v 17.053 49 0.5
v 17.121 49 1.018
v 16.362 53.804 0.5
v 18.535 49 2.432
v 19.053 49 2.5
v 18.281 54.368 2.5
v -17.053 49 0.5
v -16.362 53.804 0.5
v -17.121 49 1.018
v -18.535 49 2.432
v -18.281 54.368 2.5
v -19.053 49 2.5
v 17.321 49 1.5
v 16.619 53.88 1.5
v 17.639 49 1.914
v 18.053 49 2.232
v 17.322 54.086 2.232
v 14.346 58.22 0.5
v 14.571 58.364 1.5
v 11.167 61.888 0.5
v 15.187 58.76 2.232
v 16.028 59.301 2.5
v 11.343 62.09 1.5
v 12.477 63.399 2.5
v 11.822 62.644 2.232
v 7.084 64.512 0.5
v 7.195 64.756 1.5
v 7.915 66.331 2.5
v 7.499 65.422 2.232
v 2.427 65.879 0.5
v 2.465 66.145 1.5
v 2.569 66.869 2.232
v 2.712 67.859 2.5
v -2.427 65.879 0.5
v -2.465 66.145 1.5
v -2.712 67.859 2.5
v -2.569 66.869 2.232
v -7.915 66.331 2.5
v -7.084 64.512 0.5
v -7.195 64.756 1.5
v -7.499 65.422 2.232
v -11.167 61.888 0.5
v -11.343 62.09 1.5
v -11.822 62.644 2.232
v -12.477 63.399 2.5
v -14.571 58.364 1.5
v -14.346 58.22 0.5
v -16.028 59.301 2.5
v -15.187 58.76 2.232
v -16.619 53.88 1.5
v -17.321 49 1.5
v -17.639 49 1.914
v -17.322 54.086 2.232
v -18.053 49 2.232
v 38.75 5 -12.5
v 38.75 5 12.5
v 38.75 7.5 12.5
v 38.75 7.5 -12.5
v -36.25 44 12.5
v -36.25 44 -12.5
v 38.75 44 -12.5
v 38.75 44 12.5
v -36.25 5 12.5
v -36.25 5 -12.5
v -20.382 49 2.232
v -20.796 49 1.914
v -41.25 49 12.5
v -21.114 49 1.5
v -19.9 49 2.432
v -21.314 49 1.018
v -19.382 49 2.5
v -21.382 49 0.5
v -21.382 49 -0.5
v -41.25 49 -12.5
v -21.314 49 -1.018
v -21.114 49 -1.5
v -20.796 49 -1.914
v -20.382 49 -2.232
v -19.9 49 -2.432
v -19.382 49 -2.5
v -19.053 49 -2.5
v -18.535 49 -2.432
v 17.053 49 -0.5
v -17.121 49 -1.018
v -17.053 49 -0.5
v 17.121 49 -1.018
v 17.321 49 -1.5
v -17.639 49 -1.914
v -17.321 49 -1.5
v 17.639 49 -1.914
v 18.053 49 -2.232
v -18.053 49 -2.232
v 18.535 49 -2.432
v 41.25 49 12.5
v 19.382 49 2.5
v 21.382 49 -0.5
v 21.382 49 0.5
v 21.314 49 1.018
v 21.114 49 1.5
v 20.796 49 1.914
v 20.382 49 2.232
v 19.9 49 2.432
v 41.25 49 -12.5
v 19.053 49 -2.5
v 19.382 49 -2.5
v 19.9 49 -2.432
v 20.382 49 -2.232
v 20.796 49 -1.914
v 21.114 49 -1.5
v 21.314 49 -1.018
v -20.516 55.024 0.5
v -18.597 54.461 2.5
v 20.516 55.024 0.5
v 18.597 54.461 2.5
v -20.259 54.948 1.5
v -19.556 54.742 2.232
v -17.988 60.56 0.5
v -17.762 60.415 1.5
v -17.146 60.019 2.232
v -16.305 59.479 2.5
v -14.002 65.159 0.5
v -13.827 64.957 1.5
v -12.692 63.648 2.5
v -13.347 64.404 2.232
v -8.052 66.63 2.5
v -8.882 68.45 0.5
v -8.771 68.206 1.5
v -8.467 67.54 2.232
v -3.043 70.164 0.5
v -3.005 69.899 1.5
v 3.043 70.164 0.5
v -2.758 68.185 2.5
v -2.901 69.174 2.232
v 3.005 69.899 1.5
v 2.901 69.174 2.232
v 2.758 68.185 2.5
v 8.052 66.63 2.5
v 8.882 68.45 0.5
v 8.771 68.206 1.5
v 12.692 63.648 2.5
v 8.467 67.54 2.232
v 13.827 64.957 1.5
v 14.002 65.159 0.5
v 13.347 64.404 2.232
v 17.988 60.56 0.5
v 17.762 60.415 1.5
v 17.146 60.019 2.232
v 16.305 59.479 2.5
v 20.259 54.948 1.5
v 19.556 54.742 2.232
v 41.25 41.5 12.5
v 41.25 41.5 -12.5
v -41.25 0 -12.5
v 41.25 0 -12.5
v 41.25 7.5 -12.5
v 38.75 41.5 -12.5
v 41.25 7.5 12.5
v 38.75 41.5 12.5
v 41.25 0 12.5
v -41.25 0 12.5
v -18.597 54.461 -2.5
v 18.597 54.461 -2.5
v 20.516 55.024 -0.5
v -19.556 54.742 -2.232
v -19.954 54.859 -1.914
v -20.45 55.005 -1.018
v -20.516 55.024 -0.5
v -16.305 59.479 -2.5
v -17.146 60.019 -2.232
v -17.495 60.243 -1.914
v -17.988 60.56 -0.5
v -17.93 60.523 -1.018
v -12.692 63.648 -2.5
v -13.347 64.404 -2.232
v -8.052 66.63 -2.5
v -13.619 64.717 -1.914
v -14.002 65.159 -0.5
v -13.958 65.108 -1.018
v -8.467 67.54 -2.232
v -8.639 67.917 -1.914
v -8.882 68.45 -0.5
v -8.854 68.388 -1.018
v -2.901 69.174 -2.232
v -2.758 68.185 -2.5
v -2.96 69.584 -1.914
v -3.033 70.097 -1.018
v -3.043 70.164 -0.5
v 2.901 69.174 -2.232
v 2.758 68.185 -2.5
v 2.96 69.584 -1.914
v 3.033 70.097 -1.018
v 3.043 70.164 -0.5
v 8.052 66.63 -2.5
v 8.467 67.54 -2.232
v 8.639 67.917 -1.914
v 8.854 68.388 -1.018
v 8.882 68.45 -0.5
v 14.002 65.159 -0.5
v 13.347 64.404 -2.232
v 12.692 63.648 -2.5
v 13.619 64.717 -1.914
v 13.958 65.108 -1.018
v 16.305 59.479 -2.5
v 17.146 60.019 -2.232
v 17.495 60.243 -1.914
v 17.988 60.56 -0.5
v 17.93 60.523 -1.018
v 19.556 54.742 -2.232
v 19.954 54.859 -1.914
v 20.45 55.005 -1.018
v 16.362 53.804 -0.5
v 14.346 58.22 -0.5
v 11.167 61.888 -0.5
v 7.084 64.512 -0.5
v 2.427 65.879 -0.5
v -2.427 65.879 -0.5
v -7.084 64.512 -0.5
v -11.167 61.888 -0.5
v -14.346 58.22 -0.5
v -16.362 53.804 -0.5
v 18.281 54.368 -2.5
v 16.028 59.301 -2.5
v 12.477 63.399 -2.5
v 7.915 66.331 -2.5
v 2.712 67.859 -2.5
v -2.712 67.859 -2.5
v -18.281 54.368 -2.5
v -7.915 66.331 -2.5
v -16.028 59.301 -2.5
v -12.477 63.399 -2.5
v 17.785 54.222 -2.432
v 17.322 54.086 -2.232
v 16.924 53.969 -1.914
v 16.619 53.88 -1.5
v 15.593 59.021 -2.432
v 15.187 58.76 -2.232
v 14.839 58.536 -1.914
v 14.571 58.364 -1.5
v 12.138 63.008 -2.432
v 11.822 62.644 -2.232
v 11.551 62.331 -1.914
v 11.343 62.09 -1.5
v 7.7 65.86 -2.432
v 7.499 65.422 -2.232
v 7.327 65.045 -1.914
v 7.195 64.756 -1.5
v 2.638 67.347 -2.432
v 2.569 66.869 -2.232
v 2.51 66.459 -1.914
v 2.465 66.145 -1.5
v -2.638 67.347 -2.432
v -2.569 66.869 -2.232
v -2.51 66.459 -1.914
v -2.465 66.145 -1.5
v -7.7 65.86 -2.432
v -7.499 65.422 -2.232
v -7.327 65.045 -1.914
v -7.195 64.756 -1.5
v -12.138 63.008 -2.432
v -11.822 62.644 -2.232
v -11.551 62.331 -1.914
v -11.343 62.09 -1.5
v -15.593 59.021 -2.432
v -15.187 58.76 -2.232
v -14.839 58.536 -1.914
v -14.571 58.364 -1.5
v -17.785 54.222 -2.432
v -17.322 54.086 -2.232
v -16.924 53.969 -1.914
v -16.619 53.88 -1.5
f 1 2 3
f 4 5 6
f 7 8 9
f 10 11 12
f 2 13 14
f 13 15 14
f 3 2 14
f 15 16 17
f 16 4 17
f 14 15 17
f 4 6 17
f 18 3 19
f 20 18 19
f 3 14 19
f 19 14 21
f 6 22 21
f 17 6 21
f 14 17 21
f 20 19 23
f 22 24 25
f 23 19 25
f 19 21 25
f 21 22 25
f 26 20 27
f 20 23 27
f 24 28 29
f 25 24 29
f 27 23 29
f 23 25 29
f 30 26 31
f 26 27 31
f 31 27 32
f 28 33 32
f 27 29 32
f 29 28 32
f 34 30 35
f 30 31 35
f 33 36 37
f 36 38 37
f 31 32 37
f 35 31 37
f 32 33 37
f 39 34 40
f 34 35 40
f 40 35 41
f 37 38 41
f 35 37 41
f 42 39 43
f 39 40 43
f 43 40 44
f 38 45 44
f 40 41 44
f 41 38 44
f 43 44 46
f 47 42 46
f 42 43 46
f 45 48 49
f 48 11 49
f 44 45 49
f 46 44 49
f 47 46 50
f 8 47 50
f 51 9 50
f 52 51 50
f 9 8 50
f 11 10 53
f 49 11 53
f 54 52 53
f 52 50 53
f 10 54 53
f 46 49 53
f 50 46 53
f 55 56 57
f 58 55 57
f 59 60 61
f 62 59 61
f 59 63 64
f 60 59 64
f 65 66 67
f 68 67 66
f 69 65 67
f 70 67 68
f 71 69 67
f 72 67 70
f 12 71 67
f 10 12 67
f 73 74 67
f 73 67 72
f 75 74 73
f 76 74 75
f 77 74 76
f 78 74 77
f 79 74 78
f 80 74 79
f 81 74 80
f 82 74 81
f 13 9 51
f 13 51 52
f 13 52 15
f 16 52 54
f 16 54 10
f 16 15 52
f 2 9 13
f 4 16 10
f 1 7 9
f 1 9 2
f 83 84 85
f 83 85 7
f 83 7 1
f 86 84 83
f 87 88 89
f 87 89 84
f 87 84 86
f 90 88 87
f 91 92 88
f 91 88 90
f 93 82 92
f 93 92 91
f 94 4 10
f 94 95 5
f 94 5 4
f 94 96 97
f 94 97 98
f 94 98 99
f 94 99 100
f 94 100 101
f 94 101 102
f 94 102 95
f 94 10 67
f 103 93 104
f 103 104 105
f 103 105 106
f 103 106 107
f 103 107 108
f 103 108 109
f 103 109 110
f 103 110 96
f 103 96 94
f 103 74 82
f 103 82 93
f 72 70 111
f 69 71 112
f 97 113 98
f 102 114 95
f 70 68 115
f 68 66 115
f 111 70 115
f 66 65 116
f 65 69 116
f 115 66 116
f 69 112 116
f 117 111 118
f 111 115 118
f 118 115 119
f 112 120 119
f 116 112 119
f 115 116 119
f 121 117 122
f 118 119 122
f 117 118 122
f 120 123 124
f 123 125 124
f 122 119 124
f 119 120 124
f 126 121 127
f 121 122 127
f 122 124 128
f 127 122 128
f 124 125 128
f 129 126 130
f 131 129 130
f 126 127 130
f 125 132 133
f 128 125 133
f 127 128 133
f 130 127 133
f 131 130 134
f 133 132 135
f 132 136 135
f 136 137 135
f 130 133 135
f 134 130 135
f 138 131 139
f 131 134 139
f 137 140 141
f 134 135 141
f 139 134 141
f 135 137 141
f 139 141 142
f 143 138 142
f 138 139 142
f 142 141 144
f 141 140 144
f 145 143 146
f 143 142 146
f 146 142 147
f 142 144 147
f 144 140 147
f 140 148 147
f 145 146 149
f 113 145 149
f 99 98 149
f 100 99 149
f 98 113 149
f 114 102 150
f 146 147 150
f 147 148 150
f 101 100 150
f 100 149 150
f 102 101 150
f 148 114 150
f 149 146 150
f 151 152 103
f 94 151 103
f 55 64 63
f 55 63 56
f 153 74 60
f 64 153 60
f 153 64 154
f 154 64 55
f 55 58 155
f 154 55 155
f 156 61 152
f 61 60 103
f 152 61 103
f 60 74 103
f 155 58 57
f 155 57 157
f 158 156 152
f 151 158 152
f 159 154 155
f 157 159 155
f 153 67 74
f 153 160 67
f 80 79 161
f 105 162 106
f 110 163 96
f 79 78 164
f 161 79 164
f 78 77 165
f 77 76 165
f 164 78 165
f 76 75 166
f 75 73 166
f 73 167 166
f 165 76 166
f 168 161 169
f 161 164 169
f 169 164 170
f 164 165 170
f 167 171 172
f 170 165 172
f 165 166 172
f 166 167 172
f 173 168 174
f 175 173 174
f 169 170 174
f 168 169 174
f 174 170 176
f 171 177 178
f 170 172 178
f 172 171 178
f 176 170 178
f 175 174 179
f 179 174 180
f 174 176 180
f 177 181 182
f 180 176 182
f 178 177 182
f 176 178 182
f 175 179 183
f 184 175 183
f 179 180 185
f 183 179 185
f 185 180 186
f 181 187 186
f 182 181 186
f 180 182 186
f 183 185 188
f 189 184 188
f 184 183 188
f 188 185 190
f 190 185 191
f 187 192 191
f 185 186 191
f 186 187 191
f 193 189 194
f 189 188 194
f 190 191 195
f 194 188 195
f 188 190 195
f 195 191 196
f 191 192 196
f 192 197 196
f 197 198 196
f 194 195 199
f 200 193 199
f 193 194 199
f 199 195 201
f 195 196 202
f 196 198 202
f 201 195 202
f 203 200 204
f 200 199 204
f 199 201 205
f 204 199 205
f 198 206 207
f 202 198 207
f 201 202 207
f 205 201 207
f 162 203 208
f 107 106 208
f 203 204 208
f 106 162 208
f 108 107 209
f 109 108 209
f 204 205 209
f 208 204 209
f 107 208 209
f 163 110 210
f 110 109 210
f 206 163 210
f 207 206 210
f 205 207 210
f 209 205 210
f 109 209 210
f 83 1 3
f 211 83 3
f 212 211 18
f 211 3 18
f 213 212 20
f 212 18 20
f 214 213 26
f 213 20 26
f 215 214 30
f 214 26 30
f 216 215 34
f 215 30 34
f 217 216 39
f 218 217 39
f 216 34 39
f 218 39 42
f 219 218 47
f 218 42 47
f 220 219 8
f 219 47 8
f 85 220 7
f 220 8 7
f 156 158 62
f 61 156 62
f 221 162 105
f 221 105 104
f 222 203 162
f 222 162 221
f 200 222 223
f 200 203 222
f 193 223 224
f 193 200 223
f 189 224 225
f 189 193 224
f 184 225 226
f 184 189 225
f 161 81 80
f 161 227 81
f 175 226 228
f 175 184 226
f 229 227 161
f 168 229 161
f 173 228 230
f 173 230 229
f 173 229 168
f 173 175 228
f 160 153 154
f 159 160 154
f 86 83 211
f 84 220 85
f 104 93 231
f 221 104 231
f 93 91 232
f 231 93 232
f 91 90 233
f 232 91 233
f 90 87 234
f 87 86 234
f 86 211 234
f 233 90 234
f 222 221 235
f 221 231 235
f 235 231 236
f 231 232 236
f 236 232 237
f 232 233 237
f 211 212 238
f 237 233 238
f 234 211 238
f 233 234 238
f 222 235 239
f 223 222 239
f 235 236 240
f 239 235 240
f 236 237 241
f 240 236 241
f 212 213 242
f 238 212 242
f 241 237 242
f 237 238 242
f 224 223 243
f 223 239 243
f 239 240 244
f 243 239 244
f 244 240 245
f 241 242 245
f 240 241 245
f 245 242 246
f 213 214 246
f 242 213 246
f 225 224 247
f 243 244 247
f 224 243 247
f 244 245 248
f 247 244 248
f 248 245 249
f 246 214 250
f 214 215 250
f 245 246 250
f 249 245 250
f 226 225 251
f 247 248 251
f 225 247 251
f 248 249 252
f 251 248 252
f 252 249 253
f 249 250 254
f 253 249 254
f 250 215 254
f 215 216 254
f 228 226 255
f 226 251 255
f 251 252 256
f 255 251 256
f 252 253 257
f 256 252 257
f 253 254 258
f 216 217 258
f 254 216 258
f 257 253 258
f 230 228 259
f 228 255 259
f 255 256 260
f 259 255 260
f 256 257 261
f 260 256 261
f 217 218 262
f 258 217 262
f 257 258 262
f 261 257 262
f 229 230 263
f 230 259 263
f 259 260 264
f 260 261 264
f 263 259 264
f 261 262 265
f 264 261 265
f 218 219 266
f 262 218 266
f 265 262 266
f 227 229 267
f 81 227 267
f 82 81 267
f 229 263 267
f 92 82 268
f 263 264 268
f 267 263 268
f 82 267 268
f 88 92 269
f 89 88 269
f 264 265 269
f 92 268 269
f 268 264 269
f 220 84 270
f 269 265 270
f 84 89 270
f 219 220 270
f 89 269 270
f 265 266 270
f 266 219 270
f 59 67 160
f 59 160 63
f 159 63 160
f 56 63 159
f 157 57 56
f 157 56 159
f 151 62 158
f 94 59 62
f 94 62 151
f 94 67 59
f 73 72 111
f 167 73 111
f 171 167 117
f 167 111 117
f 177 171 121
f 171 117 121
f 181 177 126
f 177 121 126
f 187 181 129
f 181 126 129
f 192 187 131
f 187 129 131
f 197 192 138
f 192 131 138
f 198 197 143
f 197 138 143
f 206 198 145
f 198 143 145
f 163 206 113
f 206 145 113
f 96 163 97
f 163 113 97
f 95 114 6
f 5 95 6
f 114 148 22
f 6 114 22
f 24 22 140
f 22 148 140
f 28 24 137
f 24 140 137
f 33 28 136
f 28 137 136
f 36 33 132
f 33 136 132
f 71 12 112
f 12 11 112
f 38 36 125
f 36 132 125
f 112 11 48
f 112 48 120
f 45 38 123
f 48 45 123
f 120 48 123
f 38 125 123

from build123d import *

# Parameters (mm, degrees)
SKETCH1_W               = 82.5
SKETCH1_H               = 25
BOSS_EXTRUDE1_DEPTH     = 5
SKETCH2_W               = 5
SKETCH2_H               = 25
BOSS_EXTRUDE2_DEPTH     = 39
SKETCH3_W               = 82.5
SKETCH3_H               = 25
BOSS_EXTRUDE3_DEPTH     = 5
BOSS_EXTRUDE4_DEPTH     = 2.5
SKETCH5_W               = 2.5
SKETCH5_H               = 39
BOSS_EXTRUDE5_DEPTH     = 25
CUT_EXTRUDE1_DEPTH      = 86.323912034
CUT_EXTRUDE1_DEPTH_BACK = 25
SKETCH6_W               = 5
SKETCH6_H               = 34
FILLET1_R               = 2
FILLET2_R               = 2


with BuildPart() as part:
    # Sketch1 → Boss-Extrude1 (new body)
    with BuildSketch(Plane(origin=(0, 0, 0), x_dir=(1, 0, 0), z_dir=(0, 1, 0))):
        Rectangle(SKETCH1_W, SKETCH1_H)
    extrude(amount=BOSS_EXTRUDE1_DEPTH)

    # Sketch2 → Boss-Extrude2 (add)
    with BuildSketch(Plane(origin=(0, 5, 0), x_dir=(1, 0, 0), z_dir=(0, 1, 0))):
        with Locations((-38.75, 0)):
            Rectangle(SKETCH2_W, SKETCH2_H)
    extrude(amount=BOSS_EXTRUDE2_DEPTH)

    # Sketch3 → Boss-Extrude3 (add)
    with BuildSketch(Plane(origin=(0, 44, 0), x_dir=(1, 0, 0), z_dir=(0, 1, 0))):
        Rectangle(SKETCH3_W, SKETCH3_H)
    extrude(amount=BOSS_EXTRUDE3_DEPTH)

    # Sketch4 → Boss-Extrude4 (add, symmetric)
    with BuildSketch(Plane.XY):
        with BuildLine():
            Line((-17.053024247, 49), (-21.381868864, 49))
            ThreePointArc((-21.381868864, 49), (0, 70.381868864), (21.381868864, 49))
            Line((21.381868864, 49), (17.053024247, 49))
            ThreePointArc((17.053024247, 49), (0, 66.053024247), (-17.053024247, 49))
        make_face()
    extrude(amount=BOSS_EXTRUDE4_DEPTH, both=True)

    # Sketch5 → Boss-Extrude5 (add)
    with BuildSketch(Plane.XY.offset(12.5)):
        with Locations((40, 24.5)):
            Rectangle(SKETCH5_W, SKETCH5_H)
    extrude(amount=-BOSS_EXTRUDE5_DEPTH)

    # Sketch6 → Cut-Extrude1 (cut, two sides: drawn at the far end of the back side and taken through both)
    with BuildSketch(Plane.XY.offset(12.5).offset(-CUT_EXTRUDE1_DEPTH_BACK)):
        with Locations((38.75, 24.5)):
            Rectangle(SKETCH6_W, SKETCH6_H)
    extrude(amount=CUT_EXTRUDE1_DEPTH + CUT_EXTRUDE1_DEPTH_BACK, mode=Mode.SUBTRACT)

    # Fillet1
    fillet1_edges = [part.edges().sort_by_distance(p)[0] for p in [
        (0, 70.381868864, -2.5),
        (0, 70.381868864, 2.5),
    ]]
    fillet(fillet1_edges, radius=FILLET1_R)

    # Fillet2
    fillet2_edges = [part.edges().sort_by_distance(p)[0] for p in [
        (0, 66.053024247, -2.5),
        (0, 66.053024247, 2.5),
    ]]
    fillet(fillet2_edges, radius=FILLET2_R)


solid = part.part
